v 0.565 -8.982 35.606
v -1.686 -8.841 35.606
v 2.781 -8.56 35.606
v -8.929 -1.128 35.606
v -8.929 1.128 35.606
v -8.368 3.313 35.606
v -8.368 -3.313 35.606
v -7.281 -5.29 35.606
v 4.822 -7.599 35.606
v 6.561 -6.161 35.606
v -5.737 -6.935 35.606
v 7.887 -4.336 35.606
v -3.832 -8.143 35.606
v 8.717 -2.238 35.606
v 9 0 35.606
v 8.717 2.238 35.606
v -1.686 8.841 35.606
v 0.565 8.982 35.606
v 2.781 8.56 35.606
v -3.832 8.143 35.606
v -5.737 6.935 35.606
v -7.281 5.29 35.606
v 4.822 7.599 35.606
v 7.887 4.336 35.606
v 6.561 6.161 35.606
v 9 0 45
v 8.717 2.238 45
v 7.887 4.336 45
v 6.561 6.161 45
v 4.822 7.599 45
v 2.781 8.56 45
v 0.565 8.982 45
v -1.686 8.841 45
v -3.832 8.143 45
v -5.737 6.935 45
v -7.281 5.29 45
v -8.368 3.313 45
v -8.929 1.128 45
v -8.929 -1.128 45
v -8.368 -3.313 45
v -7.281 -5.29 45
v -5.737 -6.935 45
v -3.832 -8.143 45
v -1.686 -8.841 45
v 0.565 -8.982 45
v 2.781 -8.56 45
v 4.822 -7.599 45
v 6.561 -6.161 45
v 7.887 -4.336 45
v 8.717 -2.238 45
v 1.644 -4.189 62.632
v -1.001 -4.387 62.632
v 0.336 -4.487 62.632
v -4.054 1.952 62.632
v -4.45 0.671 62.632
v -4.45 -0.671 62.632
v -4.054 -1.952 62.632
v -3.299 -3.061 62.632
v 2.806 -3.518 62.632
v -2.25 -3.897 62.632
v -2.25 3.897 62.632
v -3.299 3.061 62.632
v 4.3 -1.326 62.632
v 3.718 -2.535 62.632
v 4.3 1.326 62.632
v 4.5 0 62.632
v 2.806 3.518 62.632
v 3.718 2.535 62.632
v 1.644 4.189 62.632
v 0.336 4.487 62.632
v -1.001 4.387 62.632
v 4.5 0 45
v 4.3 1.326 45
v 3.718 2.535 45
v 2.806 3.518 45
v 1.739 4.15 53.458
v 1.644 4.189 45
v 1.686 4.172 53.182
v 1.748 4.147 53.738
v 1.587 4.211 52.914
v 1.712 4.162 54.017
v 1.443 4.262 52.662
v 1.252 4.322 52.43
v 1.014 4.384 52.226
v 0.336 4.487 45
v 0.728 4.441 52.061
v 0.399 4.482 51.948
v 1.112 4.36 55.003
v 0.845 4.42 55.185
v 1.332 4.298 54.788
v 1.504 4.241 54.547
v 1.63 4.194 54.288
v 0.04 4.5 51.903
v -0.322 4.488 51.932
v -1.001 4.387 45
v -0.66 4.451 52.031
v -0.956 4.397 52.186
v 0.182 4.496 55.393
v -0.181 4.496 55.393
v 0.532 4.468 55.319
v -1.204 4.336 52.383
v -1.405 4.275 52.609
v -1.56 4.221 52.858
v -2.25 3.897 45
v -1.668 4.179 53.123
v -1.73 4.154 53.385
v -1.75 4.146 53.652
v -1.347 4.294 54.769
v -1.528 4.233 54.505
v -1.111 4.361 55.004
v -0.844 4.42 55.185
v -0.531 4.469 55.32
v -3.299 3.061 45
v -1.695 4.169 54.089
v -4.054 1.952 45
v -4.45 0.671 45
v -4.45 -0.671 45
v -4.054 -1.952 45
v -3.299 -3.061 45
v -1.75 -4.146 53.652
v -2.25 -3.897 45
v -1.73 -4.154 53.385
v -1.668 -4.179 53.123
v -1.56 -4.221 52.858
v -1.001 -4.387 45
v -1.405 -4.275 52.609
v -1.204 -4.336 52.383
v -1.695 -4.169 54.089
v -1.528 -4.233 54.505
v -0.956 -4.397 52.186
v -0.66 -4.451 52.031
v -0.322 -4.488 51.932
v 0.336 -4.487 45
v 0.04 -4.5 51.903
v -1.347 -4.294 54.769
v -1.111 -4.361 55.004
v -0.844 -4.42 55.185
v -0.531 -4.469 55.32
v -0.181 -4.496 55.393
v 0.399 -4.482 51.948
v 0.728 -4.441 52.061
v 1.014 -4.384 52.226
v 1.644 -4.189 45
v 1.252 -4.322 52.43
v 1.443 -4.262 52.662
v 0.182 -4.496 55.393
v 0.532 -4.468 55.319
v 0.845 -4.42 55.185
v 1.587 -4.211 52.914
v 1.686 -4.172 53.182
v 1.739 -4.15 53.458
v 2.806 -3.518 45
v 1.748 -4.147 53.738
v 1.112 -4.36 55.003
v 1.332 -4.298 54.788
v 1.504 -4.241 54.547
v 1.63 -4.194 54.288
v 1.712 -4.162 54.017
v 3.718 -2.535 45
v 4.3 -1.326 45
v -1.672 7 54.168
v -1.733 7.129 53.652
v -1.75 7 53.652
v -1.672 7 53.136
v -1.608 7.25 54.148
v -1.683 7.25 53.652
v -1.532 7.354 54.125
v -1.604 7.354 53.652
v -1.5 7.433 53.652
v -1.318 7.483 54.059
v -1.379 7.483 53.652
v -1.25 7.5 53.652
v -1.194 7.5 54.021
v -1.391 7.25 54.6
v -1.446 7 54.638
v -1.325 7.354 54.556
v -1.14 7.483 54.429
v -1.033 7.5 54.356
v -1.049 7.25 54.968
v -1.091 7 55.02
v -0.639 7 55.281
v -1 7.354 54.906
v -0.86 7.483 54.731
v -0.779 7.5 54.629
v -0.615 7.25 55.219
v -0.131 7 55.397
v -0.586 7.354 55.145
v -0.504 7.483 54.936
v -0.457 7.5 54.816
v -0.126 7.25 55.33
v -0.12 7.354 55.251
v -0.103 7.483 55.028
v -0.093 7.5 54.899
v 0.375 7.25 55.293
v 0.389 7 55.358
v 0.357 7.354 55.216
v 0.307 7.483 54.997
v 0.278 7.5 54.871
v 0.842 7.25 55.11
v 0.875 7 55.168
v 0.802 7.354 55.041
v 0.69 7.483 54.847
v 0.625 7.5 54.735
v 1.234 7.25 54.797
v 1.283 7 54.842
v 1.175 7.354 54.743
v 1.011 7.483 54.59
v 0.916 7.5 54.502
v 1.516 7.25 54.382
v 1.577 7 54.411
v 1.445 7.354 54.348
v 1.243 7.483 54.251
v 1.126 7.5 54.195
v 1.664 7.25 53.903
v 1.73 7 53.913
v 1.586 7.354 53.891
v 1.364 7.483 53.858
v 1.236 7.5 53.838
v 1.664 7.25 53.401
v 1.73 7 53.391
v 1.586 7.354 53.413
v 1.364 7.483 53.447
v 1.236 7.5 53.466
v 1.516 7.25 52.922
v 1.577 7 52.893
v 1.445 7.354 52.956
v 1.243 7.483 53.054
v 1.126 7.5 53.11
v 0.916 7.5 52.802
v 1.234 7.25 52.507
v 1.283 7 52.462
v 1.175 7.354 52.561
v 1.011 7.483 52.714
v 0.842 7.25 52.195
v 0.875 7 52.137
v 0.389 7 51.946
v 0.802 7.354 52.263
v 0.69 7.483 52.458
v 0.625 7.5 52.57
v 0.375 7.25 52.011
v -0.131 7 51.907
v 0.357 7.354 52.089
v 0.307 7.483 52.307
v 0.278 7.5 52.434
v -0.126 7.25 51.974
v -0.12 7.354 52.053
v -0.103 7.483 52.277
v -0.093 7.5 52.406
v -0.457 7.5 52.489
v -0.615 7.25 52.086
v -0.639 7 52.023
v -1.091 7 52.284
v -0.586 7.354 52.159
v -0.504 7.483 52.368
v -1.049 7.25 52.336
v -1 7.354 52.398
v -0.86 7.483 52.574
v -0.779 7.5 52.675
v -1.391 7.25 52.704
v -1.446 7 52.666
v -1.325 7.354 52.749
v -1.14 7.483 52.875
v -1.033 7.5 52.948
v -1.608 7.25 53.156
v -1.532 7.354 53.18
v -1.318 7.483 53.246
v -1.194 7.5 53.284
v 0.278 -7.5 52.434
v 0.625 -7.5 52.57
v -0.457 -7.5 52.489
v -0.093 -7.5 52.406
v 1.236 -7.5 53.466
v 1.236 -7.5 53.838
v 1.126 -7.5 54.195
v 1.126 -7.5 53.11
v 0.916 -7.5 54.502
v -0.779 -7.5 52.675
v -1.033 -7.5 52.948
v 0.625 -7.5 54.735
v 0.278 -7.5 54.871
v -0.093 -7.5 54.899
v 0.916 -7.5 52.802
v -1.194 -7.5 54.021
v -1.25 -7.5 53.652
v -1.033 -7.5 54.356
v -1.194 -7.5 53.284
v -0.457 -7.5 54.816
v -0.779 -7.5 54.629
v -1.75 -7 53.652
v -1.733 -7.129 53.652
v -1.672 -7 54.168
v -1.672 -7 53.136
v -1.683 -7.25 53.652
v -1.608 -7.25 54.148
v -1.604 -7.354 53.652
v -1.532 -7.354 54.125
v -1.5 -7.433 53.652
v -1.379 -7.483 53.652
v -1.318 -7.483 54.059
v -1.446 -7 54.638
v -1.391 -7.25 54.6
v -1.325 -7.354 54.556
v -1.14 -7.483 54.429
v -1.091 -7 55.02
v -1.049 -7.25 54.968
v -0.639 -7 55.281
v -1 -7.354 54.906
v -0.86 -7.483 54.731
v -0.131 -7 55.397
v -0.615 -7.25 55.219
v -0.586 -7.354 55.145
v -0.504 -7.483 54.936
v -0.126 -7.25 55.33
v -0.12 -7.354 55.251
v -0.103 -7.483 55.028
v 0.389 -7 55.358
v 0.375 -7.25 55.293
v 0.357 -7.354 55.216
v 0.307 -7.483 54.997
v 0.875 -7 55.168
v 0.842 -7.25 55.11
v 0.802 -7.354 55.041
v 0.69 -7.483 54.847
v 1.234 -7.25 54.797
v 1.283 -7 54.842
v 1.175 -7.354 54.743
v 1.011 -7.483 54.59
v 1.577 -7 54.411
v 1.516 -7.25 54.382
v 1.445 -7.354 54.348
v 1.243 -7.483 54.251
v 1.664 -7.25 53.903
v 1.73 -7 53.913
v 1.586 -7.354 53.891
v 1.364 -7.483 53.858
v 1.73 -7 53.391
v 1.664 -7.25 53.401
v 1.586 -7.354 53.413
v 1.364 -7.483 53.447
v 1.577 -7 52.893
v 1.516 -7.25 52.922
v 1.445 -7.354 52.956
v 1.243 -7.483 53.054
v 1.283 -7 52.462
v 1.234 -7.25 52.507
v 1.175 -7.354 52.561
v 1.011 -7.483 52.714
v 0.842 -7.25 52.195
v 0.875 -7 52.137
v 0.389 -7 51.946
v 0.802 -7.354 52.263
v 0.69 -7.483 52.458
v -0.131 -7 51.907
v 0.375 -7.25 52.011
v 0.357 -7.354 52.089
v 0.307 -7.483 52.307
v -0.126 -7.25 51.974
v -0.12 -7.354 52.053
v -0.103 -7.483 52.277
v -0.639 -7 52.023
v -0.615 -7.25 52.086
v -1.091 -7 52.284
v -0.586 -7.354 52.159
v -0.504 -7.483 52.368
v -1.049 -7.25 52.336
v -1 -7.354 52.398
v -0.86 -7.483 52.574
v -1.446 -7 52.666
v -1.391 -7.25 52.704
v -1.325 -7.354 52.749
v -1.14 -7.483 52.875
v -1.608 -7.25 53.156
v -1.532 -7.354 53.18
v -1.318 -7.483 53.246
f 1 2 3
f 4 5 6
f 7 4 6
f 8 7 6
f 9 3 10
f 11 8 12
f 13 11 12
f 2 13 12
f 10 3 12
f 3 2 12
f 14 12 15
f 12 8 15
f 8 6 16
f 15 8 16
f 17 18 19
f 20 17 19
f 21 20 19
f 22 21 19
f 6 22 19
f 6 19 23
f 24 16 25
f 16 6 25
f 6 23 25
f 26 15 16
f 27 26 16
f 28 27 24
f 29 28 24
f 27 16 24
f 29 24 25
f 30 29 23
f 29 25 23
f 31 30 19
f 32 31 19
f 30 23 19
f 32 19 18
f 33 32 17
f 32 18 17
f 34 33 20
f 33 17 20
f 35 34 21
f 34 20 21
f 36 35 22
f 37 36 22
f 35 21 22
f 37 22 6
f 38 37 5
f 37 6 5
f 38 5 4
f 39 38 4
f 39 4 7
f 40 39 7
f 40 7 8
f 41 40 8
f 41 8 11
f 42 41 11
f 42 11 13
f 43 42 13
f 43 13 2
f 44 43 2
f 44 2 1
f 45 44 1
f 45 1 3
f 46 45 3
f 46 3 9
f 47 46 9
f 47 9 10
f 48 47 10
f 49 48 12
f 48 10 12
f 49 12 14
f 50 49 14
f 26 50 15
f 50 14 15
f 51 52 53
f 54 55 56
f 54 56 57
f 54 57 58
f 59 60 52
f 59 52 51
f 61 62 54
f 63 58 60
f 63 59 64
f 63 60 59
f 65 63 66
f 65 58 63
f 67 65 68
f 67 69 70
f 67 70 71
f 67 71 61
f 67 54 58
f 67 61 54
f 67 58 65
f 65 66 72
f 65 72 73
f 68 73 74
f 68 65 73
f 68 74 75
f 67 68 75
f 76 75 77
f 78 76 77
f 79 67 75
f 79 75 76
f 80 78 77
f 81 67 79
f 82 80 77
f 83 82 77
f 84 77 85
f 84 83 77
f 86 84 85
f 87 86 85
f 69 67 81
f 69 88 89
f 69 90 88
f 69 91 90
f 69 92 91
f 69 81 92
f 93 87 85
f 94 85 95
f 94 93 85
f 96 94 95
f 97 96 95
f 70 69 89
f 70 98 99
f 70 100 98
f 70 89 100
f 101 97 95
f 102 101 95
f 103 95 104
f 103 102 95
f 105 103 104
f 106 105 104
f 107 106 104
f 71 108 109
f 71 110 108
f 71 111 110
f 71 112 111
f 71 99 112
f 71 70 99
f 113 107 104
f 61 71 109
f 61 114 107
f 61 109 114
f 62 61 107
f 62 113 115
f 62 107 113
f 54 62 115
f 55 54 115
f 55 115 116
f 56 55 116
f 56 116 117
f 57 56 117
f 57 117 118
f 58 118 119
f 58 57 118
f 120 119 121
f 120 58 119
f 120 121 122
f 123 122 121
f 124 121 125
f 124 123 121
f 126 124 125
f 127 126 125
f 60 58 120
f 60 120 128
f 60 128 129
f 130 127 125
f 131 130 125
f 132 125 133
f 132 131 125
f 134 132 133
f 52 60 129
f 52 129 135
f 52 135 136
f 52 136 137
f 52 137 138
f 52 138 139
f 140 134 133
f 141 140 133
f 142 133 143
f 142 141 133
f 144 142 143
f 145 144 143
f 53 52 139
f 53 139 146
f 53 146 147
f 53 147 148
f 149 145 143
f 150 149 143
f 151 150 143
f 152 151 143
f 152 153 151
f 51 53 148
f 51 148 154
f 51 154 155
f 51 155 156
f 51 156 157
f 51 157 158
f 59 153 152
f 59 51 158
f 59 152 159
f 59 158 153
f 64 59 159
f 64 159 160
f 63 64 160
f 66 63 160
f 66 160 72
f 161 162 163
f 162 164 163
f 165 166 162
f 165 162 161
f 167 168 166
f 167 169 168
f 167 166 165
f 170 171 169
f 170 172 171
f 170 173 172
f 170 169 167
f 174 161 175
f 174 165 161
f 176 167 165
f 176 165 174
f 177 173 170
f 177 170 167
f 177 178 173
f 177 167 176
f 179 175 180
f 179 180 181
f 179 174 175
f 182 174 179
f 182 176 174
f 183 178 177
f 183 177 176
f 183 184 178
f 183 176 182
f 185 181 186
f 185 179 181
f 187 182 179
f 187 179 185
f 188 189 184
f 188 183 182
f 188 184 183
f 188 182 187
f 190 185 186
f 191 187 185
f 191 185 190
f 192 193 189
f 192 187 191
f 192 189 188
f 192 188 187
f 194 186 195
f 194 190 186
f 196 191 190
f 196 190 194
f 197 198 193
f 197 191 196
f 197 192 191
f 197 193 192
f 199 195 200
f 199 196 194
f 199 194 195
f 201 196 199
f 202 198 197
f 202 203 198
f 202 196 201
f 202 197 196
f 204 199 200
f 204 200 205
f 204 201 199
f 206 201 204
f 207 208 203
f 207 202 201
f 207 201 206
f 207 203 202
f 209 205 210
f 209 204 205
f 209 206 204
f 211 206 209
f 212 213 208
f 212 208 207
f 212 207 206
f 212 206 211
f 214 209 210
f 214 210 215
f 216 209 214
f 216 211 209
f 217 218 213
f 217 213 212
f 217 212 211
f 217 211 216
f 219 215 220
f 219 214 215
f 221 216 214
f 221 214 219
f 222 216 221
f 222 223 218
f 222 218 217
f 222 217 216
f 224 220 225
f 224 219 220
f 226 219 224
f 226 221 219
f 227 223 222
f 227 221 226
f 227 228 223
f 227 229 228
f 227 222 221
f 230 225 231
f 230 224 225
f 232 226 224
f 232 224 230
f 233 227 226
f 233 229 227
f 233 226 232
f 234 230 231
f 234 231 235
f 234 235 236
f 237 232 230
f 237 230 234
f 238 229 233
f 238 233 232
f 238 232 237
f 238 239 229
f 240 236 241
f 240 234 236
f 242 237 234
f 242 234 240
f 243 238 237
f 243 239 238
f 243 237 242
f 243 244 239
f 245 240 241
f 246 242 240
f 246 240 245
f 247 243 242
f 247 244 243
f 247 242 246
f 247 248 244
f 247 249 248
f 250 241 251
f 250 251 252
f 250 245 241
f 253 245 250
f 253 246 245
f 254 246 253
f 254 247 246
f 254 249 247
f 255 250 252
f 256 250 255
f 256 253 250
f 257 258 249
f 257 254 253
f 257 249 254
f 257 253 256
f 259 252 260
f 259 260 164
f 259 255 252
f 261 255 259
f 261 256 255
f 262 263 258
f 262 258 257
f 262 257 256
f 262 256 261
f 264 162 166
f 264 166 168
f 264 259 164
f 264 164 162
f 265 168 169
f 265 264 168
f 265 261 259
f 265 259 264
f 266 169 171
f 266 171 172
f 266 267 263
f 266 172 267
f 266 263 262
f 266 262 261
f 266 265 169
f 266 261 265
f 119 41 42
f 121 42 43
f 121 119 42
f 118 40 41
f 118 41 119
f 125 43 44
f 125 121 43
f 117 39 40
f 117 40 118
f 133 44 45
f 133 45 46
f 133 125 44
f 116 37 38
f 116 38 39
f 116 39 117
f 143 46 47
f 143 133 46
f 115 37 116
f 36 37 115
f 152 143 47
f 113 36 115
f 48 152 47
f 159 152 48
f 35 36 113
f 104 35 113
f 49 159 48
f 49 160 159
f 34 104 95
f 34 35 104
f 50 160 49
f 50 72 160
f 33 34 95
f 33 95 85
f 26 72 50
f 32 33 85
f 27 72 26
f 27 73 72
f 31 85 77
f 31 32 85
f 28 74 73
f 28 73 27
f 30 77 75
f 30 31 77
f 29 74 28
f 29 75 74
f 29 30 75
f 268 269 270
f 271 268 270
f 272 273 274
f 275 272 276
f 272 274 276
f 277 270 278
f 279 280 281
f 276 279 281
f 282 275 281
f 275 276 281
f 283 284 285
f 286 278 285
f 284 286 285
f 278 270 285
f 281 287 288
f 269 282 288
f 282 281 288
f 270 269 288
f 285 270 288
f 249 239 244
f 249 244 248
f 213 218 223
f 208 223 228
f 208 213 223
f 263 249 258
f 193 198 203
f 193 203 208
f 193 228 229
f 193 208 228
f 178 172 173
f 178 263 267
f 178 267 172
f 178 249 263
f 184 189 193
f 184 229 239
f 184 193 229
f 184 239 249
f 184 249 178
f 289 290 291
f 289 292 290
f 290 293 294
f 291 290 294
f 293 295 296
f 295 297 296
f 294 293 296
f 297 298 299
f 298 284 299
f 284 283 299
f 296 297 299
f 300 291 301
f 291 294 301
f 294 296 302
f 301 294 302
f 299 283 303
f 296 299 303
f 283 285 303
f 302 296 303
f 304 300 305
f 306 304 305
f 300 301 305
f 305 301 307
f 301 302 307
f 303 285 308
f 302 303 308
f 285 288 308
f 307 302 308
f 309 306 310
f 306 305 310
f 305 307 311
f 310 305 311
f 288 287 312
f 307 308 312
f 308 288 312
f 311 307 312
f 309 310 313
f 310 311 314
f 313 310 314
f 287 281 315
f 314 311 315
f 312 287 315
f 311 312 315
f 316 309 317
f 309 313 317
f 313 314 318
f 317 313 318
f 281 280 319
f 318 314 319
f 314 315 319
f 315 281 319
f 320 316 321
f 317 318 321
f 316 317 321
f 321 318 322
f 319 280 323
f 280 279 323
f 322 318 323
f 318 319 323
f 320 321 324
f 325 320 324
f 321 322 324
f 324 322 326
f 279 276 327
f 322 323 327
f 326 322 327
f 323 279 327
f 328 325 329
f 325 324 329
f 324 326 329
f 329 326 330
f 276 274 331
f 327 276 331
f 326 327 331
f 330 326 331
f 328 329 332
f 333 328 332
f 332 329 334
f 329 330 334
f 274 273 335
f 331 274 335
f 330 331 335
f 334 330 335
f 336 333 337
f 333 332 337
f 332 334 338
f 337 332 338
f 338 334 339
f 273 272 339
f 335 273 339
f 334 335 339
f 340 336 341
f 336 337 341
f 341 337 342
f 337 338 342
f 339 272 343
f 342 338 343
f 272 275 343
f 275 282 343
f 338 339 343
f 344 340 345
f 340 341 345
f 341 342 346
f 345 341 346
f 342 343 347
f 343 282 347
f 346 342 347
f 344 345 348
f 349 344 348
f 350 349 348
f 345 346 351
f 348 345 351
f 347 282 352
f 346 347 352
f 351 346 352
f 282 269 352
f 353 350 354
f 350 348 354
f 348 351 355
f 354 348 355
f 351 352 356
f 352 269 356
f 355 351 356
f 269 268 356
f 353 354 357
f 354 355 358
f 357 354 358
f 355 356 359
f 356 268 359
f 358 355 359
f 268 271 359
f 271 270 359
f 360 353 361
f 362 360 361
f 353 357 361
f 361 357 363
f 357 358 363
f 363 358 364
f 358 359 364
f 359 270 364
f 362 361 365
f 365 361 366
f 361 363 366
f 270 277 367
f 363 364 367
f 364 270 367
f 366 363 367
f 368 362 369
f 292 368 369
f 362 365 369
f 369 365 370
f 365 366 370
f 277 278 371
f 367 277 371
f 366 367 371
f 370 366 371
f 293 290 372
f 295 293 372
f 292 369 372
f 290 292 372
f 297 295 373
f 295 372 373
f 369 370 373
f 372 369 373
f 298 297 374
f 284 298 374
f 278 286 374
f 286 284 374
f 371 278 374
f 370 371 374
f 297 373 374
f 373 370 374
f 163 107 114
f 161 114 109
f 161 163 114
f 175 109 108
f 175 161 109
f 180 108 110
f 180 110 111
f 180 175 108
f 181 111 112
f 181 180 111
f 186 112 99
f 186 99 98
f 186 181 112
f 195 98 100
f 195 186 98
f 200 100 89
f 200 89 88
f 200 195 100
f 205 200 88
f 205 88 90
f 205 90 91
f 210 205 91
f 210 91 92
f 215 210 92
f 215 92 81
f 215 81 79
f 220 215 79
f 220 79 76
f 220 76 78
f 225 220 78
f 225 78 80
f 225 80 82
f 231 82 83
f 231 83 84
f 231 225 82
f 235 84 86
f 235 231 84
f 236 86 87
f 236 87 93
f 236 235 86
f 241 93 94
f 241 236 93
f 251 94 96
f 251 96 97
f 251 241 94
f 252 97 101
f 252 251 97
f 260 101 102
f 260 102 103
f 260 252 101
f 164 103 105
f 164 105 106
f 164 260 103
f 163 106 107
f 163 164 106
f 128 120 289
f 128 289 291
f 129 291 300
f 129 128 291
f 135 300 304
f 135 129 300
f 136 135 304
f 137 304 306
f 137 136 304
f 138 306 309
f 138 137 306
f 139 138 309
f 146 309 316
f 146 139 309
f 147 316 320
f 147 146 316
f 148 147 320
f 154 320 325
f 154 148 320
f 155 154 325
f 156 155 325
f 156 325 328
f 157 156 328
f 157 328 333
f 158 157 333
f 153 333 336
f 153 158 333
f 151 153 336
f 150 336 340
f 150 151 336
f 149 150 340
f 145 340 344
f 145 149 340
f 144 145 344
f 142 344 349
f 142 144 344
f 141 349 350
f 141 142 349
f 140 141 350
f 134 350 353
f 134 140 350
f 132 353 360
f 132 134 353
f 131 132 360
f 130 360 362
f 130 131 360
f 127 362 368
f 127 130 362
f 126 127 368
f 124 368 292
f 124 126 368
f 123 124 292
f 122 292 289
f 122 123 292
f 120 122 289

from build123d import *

# Parameters (mm, degrees)
F0_R      = 9
F1_DEPTH  = 45
F2_R      = 4.5
F3_DEPTH  = 25
F6_DEPTH  = 25
F7_R      = 1.75
F8_DEPTH  = 7.5
F9_R      = 0.5
F10_R     = 0.5
F11_DEPTH = 32
F12_DEPTH = 32.36752
F13_DEPTH = 35.60573


with BuildPart() as f1:
    # F0 (on Top) → F1 (new body)
    with BuildSketch(Plane.XY):
        Circle(F0_R)
    extrude(amount=F1_DEPTH)

    # F2 (on face) → F3 (join)
    with BuildSketch(Plane.XY.offset(45)):
        Circle(F2_R)
    extrude(amount=F3_DEPTH)

    # F6 (add): a face of the model
    f6_faces = [f1.faces().sort_by_distance(p)[0] for p in [
        (0, 0, 70),
    ]]
    extrude(f6_faces, amount=F6_DEPTH)

    # F7 (on line) → F8 (join, symmetric)
    with BuildSketch(Plane(origin=(0, 0, 0), x_dir=(-1, 0, 0), z_dir=(0, 1, 0))):
        with Locations((0, 53.652189672)):
            Circle(F7_R)
    extrude(amount=F8_DEPTH, both=True)

    # F9
    f9_edges = [f1.edges().sort_by_distance(p)[0] for p in [
        (1.75, -7.5, 53.65219),
    ]]
    fillet(f9_edges, radius=F9_R)

    # F10
    f10_edges = [f1.edges().sort_by_distance(p)[0] for p in [
        (1.75, 7.5, 53.65219),
    ]]
    fillet(f10_edges, radius=F10_R)

    # F11 (add): a face of the model
    f11_faces = [f1.faces().sort_by_distance(p)[0] for p in [
        (0, 0, 95),
    ]]
    extrude(f11_faces, amount=-F11_DEPTH)

    # F12 (cut): a face of the model
    f12_faces = [f1.faces().sort_by_distance(p)[0] for p in [
        (0, 0, 95),
    ]]
    extrude(f12_faces, amount=-F12_DEPTH, mode=Mode.SUBTRACT)

    # F0 (on Top) → F13 (cut)
    with BuildSketch(Plane.XY):
        Circle(F0_R)
    extrude(amount=F13_DEPTH, mode=Mode.SUBTRACT)


solid = f1.part
